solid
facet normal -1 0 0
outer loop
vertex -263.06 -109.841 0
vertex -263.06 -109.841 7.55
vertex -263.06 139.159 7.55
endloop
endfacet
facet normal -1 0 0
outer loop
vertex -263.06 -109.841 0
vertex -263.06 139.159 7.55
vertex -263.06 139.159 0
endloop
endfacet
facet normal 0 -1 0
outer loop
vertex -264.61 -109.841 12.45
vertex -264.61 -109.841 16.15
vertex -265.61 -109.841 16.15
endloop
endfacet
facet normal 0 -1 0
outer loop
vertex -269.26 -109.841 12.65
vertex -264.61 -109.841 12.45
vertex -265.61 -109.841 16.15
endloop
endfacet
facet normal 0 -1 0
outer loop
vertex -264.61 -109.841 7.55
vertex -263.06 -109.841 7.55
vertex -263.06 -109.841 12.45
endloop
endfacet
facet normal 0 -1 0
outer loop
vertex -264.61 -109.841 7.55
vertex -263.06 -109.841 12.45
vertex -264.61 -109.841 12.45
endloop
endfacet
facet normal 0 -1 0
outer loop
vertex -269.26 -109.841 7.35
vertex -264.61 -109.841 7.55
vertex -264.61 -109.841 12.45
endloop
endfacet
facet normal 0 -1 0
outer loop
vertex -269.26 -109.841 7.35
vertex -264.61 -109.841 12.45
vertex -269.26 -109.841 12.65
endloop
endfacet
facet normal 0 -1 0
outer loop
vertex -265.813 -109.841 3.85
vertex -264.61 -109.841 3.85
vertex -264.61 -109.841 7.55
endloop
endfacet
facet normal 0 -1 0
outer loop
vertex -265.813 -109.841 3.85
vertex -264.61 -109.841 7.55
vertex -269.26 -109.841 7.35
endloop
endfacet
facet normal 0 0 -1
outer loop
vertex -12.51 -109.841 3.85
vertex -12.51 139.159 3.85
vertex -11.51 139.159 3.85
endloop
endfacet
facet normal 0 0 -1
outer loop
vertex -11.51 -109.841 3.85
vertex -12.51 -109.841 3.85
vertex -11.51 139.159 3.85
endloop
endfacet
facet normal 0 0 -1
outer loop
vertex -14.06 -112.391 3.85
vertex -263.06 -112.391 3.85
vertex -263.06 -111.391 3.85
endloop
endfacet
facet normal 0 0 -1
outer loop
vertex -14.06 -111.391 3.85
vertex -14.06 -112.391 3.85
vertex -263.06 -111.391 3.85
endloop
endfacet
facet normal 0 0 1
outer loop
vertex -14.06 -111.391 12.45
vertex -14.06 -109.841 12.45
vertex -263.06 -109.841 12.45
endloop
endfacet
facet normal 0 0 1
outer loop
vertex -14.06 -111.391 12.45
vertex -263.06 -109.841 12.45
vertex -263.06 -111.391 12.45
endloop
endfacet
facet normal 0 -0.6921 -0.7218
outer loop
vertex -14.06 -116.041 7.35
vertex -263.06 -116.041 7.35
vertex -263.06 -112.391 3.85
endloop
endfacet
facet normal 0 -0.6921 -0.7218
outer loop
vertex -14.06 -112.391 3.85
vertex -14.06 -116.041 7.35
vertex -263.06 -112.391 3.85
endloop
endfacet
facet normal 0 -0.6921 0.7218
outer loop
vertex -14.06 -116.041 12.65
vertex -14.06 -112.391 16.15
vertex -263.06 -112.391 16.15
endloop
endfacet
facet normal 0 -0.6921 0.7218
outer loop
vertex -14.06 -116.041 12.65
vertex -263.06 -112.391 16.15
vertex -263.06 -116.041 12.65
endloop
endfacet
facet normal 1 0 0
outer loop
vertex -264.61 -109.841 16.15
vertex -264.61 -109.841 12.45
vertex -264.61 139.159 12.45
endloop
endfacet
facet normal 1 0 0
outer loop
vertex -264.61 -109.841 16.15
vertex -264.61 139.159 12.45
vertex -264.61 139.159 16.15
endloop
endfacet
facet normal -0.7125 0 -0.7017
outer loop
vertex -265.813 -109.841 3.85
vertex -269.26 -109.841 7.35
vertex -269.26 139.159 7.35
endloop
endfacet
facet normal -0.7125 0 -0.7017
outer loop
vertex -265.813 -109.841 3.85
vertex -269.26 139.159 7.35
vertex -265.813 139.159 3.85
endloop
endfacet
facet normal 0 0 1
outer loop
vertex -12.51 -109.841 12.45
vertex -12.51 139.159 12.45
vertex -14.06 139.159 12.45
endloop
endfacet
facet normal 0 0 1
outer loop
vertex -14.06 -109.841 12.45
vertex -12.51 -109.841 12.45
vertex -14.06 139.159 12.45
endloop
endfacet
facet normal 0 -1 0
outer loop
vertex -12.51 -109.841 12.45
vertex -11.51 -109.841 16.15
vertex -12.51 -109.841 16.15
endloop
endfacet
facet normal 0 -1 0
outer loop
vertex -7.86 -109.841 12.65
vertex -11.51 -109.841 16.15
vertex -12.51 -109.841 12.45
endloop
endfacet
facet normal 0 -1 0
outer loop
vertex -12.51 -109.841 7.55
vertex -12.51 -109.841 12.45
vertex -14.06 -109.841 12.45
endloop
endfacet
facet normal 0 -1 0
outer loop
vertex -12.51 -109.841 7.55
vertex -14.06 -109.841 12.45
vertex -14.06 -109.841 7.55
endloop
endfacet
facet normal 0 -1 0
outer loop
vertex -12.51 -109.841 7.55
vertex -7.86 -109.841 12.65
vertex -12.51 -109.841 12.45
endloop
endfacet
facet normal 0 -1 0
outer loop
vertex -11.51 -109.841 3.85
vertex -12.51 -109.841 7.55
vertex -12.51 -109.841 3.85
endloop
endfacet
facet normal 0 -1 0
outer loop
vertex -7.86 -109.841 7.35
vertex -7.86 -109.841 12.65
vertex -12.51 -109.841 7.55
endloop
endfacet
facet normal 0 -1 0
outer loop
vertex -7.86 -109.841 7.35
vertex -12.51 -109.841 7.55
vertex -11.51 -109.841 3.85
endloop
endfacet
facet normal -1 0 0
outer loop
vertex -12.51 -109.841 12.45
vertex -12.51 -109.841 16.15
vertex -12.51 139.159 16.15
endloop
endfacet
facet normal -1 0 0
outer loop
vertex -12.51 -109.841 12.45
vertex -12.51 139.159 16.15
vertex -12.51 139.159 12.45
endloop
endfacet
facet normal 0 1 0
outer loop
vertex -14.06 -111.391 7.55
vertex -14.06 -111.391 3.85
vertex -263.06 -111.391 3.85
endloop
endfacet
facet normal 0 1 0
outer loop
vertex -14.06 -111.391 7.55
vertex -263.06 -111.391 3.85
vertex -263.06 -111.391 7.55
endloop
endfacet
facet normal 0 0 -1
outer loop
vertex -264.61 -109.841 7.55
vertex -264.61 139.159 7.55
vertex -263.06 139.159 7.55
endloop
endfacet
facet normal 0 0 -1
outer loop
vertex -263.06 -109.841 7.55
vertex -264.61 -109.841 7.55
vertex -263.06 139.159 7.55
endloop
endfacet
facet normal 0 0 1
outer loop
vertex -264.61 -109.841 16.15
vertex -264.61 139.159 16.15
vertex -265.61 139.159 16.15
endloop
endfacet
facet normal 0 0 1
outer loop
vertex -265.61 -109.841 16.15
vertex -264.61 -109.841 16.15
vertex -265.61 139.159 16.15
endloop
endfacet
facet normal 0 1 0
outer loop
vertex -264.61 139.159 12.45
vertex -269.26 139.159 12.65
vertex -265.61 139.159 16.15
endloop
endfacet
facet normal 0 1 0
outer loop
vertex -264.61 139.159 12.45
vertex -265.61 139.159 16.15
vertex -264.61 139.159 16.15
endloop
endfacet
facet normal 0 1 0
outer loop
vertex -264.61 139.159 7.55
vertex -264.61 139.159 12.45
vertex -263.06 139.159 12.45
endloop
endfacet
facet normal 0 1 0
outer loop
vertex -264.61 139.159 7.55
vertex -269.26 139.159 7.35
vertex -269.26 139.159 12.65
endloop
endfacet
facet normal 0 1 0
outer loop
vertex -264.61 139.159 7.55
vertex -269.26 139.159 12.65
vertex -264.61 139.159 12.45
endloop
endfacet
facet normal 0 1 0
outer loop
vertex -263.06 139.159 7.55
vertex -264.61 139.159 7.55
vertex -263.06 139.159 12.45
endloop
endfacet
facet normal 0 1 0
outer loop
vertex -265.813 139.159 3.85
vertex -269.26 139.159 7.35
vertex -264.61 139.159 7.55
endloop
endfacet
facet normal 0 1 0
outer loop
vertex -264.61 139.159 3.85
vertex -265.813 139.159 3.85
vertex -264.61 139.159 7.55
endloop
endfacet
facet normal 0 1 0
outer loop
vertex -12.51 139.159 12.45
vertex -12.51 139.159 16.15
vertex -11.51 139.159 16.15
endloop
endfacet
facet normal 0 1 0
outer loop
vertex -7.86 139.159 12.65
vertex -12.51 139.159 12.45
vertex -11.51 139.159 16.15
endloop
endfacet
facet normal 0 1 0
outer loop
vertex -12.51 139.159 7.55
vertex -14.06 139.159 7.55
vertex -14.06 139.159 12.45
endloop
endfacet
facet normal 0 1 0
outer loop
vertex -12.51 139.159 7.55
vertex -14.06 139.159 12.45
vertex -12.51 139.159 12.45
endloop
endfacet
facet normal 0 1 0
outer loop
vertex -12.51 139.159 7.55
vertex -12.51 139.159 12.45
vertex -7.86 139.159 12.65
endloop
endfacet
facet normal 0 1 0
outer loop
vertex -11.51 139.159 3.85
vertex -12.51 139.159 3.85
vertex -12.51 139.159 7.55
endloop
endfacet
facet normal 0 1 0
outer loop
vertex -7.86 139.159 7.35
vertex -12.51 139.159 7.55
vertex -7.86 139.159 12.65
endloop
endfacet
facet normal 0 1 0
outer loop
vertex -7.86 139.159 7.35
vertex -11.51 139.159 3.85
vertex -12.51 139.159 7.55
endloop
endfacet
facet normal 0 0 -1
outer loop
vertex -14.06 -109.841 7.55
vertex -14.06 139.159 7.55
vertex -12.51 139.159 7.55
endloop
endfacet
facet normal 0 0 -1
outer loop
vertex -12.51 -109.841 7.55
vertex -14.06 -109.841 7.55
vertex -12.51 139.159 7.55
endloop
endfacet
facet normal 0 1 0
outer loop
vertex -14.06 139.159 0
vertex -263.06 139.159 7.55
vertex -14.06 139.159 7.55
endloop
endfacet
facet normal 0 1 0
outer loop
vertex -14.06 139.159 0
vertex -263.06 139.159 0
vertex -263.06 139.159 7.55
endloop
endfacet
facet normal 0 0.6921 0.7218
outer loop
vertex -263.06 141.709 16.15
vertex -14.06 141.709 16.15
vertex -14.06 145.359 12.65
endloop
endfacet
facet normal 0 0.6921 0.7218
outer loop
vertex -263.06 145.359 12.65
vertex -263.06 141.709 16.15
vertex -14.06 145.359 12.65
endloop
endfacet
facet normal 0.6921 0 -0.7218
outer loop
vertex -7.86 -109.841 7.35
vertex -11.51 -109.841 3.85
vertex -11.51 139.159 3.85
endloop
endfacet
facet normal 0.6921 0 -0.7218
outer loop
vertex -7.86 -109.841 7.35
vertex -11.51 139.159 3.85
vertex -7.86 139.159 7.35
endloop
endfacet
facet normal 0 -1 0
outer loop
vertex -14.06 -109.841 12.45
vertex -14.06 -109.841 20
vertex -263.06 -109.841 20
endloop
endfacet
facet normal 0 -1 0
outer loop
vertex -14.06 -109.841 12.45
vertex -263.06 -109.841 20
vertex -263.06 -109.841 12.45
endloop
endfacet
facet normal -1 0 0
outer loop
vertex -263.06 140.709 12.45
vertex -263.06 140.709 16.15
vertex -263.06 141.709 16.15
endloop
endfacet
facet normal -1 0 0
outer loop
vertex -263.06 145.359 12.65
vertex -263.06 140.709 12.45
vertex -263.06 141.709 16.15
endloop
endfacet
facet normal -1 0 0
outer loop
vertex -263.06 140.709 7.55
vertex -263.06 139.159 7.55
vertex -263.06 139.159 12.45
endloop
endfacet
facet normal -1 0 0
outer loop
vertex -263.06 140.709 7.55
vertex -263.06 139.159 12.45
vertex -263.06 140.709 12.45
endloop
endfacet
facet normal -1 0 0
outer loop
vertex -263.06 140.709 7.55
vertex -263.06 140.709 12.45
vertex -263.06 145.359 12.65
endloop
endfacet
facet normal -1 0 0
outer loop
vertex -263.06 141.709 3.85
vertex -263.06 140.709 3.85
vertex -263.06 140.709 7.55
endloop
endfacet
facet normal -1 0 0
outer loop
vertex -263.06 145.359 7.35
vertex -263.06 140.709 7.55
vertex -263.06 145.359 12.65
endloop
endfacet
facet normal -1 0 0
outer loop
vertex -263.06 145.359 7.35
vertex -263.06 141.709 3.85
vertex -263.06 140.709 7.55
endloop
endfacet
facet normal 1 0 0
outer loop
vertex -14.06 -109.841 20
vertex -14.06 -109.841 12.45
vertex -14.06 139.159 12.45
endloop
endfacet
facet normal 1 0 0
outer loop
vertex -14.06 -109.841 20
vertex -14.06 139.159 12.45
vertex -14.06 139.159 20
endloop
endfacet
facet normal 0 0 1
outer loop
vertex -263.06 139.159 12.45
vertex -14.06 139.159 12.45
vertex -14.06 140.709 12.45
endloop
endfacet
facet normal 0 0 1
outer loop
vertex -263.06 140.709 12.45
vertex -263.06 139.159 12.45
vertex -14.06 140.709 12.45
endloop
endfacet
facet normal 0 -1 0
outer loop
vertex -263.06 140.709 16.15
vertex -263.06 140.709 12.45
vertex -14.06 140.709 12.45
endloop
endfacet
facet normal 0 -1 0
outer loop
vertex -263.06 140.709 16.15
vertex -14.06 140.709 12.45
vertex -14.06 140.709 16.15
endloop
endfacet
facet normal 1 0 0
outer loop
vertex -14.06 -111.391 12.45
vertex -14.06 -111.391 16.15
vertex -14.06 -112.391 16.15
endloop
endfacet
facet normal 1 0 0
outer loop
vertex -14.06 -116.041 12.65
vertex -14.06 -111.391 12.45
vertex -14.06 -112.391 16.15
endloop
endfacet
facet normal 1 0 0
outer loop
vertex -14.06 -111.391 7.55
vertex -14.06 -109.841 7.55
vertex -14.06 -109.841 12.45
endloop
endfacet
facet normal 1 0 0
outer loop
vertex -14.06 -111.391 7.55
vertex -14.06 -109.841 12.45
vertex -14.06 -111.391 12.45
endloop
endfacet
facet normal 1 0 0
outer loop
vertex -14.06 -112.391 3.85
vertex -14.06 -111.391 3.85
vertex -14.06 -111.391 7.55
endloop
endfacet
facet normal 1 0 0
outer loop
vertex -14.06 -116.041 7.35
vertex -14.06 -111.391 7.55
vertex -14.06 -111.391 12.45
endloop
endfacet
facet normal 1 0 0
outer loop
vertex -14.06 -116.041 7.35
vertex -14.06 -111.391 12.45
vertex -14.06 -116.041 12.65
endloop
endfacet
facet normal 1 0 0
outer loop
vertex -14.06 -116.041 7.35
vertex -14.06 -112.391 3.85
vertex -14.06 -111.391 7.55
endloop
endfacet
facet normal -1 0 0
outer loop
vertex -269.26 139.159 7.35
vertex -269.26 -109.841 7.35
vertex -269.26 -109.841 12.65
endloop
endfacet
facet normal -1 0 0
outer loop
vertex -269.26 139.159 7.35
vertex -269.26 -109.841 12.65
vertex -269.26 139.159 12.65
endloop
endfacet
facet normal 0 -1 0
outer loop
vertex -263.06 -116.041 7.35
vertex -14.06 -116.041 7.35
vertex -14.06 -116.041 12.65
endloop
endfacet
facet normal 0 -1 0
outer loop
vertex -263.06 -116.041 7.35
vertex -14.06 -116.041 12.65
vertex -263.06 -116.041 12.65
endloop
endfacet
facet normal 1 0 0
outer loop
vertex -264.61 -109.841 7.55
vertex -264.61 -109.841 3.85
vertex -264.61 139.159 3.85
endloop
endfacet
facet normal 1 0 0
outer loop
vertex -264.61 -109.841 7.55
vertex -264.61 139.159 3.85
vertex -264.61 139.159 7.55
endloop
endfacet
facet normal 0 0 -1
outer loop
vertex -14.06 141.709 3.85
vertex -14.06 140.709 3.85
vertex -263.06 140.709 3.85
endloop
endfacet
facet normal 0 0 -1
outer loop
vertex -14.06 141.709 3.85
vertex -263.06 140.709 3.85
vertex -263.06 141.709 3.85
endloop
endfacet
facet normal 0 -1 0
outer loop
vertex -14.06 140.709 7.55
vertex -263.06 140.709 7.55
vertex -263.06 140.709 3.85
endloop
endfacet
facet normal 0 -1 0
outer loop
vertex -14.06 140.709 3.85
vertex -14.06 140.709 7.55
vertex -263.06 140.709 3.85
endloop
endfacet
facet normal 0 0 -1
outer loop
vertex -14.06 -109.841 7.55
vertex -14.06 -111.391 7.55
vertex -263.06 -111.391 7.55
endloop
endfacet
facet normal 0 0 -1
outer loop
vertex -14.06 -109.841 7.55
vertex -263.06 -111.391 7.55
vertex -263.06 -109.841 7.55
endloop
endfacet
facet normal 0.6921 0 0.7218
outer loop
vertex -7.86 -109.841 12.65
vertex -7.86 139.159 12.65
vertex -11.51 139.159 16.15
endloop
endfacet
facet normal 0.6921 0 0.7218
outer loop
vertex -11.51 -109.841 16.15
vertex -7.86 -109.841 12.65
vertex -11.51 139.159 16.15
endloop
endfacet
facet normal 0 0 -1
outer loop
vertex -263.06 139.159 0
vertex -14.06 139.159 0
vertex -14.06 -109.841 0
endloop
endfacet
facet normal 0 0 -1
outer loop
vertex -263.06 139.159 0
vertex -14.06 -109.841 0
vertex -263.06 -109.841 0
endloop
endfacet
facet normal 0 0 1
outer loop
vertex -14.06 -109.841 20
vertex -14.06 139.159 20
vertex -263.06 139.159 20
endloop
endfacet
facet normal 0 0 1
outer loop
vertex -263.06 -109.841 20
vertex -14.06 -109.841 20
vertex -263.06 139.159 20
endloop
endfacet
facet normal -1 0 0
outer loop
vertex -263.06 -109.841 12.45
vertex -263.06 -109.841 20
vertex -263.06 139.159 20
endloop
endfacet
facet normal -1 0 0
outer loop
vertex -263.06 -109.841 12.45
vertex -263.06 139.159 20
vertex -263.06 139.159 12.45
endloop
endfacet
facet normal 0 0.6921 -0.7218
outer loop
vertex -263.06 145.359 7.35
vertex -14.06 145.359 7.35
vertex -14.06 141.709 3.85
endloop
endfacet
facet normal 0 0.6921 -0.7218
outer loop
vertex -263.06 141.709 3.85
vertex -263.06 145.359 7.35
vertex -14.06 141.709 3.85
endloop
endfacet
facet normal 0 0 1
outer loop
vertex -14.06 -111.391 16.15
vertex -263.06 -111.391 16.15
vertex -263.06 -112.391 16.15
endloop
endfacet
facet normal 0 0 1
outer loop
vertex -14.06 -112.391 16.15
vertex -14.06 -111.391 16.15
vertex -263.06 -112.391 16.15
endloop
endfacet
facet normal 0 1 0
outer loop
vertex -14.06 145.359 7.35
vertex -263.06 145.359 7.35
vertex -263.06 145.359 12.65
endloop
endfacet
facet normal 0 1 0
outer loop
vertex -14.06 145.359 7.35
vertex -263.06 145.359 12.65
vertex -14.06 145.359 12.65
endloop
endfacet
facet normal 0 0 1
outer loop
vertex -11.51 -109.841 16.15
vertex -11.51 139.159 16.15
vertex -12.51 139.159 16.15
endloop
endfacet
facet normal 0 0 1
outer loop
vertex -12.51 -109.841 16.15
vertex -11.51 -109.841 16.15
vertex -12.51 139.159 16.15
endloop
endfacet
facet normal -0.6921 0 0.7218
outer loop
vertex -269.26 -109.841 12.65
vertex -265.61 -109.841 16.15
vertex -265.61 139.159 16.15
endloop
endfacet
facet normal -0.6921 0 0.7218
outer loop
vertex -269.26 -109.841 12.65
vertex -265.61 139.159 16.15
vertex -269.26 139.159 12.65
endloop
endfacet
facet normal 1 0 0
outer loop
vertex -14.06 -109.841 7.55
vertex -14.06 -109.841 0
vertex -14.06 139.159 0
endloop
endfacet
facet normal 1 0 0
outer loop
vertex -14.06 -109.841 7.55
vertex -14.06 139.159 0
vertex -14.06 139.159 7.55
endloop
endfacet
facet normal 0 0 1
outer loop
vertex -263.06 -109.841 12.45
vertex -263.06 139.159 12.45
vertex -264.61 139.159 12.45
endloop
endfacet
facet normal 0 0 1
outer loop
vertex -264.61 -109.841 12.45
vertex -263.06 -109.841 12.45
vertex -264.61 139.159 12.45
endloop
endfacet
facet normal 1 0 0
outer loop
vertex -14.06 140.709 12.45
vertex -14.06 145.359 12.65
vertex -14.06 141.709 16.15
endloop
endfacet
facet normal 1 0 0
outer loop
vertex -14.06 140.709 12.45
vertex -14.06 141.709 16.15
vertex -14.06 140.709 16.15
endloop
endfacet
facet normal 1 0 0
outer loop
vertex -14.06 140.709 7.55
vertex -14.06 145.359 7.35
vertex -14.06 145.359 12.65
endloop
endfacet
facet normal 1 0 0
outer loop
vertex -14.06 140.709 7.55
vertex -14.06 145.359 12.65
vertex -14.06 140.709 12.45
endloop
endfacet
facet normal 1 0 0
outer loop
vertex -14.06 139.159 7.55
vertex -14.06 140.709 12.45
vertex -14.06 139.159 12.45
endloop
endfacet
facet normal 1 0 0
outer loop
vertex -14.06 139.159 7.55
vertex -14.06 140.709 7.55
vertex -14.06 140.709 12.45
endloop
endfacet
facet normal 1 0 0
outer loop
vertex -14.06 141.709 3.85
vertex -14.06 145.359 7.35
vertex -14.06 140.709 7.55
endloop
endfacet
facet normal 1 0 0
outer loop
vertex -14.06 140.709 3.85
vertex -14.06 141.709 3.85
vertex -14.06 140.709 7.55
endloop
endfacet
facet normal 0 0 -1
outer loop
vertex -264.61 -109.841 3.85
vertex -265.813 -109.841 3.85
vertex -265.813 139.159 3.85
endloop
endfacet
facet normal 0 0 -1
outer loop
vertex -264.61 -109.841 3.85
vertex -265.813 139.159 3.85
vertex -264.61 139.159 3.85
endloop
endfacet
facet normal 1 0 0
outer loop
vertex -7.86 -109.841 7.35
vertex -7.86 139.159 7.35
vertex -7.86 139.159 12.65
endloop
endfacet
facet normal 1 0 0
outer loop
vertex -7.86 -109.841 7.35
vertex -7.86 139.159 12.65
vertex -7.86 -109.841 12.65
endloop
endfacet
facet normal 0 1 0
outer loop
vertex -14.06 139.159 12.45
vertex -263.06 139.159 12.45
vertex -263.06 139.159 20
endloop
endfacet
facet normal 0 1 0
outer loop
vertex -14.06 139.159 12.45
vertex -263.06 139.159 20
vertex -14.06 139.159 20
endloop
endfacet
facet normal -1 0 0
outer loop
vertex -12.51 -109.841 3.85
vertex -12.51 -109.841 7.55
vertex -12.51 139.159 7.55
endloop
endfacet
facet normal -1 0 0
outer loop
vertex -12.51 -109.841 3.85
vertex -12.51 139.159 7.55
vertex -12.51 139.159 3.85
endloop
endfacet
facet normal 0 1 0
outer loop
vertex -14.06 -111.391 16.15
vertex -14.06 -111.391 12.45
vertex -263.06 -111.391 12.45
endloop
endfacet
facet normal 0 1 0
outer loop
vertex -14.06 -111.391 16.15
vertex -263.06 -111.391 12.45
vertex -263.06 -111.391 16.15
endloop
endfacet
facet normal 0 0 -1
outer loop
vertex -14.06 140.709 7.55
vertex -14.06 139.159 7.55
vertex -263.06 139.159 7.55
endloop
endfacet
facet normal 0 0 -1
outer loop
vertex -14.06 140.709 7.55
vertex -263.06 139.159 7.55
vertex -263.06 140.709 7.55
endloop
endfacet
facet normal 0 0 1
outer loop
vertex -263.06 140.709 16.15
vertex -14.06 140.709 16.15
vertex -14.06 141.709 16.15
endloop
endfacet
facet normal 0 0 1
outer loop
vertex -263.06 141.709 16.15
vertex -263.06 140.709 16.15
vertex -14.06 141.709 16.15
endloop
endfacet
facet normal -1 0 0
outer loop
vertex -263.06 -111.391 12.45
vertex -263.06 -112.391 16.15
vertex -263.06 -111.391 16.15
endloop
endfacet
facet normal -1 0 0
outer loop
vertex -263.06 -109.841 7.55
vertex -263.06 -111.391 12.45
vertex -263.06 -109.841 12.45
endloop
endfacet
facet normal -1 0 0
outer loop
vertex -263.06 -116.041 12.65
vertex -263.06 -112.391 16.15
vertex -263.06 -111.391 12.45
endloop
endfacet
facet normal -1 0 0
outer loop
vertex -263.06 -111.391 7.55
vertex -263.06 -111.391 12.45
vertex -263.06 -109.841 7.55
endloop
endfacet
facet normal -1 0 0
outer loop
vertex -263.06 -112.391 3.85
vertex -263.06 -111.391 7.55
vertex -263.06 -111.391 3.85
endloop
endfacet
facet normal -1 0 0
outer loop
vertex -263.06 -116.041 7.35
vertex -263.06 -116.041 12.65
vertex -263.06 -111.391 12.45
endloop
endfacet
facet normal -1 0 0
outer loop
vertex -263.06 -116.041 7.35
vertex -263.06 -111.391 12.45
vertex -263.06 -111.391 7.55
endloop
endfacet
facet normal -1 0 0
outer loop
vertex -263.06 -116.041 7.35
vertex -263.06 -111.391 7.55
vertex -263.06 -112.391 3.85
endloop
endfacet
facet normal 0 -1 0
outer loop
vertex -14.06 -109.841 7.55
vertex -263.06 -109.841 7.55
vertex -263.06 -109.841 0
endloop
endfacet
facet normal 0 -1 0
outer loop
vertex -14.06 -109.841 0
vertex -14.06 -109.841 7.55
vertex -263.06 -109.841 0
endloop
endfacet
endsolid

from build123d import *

# Parameters (mm, degrees)
BOSS_EXTRU_3_DEPTH            = 20
ENL_V_MAT_EXTRU_11_DEPTH      = 295.374154069
ENL_V_MAT_EXTRU_11_DEPTH_BACK = 249
ENL_V_MAT_EXTRU_12_DEPTH      = 295.374154069
ENL_V_MAT_EXTRU_12_DEPTH_BACK = 249
ENL_V_MAT_EXTRU_13_DEPTH      = 372.52143865
ENL_V_MAT_EXTRU_13_DEPTH_BACK = 249
ENL_V_MAT_EXTRU_14_DEPTH      = 372.52143865
ENL_V_MAT_EXTRU_14_DEPTH_BACK = 249
ENL_V_MAT_EXTRU_15_DEPTH      = 295.374154069
ENL_V_MAT_EXTRU_15_DEPTH_BACK = 249
ENL_V_MAT_EXTRU_16_DEPTH      = 295.374154069
ENL_V_MAT_EXTRU_16_DEPTH_BACK = 249
ENL_V_MAT_EXTRU_17_DEPTH      = 372.52143865
ENL_V_MAT_EXTRU_17_DEPTH_BACK = 249
ENL_V_MAT_EXTRU_18_DEPTH      = 372.52143865
ENL_V_MAT_EXTRU_18_DEPTH_BACK = 249


with BuildPart() as part:
    # Esquisse1 → Boss.-Extru.3 (new body)
    with BuildSketch(Plane.XY):
        Polygon((-263.060356118, 145.358531169), (-14.060356118, 145.358531169), (-14.060356118, 139.158531169), (-7.860356118, 139.158531169), (-7.860356118, -109.841468831), (-14.060356118, -109.841468831), (-14.060356118, -116.041468831), (-263.060356118, -116.041468831), (-263.060356118, -109.841468831), (-269.260356118, -109.841468831), (-269.260356118, 139.158531169), (-263.060356118, 139.158531169), align=None)
    extrude(amount=BOSS_EXTRU_3_DEPTH)

    # Esquisse4 → Enlèv. mat.-Extru.11 (cut, two sides: drawn at the far end of the back side and taken through both)
    with BuildSketch(Plane(origin=(-14.060356118, 0, 0), x_dir=(0, 0, -1), z_dir=(1, 0, 0)).offset(-ENL_V_MAT_EXTRU_11_DEPTH_BACK)):
        Polygon((-553.411816833, 139.158531169), (-20, 139.158531169), (-12.45, 139.158531169), (-12.45, 140.708531169), (-16.15, 140.708531169), (-16.15, 141.708531169), (-12.65, 145.358531169), (356.535030531, 530.365777294), (-64.826371106, 1510.451097334), (-974.77321847, 1119.243851209), align=None)
    extrude(amount=ENL_V_MAT_EXTRU_11_DEPTH + ENL_V_MAT_EXTRU_11_DEPTH_BACK, mode=Mode.SUBTRACT)

    # Esquisse8 → Enlèv. mat.-Extru.12 (cut, two sides: drawn at the far end of the back side and taken through both)
    with BuildSketch(Plane(origin=(-14.060356118, 0, 0), x_dir=(0, 0, -1), z_dir=(1, 0, 0)).offset(-ENL_V_MAT_EXTRU_12_DEPTH_BACK)):
        Polygon((533.411816833, 139.158531169), (0, 139.158531169), (-7.55, 139.158531169), (-7.55, 140.708531169), (-3.85, 140.708531169), (-3.85, 141.708531169), (-7.35, 145.358531169), (-376.535030531, 530.365777294), (44.826371106, 1510.451097334), (954.77321847, 1119.243851209), align=None)
    extrude(amount=ENL_V_MAT_EXTRU_12_DEPTH + ENL_V_MAT_EXTRU_12_DEPTH_BACK, mode=Mode.SUBTRACT)

    # Esquisse10 → Enlèv. mat.-Extru.13 (cut, two sides: drawn at the far end of the back side and taken through both)
    with BuildSketch(Plane(origin=(0, 139.158531169, 0), x_dir=(1, 0, 0), z_dir=(0, 1, 0)).offset(-ENL_V_MAT_EXTRU_13_DEPTH_BACK)):
        Polygon((-654.267602243, 356.535030531), (-269.260356118, -12.65), (-265.610356118, -16.15), (-264.610356118, -16.15), (-264.610356118, -12.45), (-263.060356118, -12.45), (-263.060356118, -20), (-263.060356118, -553.411816833), (-1243.145676157, -974.77321847), (-1634.352922282, -64.826371106), align=None)
    extrude(amount=ENL_V_MAT_EXTRU_13_DEPTH + ENL_V_MAT_EXTRU_13_DEPTH_BACK, mode=Mode.SUBTRACT)

    # Esquisse11 → Enlèv. mat.-Extru.14 (cut, two sides: drawn at the far end of the back side and taken through both)
    with BuildSketch(Plane(origin=(0, 139.158531169, 0), x_dir=(1, 0, 0), z_dir=(0, 1, 0)).offset(-ENL_V_MAT_EXTRU_14_DEPTH_BACK)):
        Polygon((-643.553156031, -387.393505759), (-269.260356118, -7.35), (-265.813317082, -3.85), (-264.610356118, -3.85), (-264.610356118, -7.55), (-263.060356118, -7.55), (-263.060356118, 0), (-263.060356118, 533.411816833), (-1249.023765439, 940.82907325), (-1629.516565352, 20.023750658), align=None)
    extrude(amount=ENL_V_MAT_EXTRU_14_DEPTH + ENL_V_MAT_EXTRU_14_DEPTH_BACK, mode=Mode.SUBTRACT)

    # Esquisse12 → Enlèv. mat.-Extru.15 (cut, two sides: drawn at the far end of the back side and taken through both)
    with BuildSketch(Plane.ZY.offset(263.060356118).offset(-ENL_V_MAT_EXTRU_15_DEPTH_BACK)):
        Polygon((-356.535030531, -501.048714956), (12.65, -116.041468831), (16.15, -112.391468831), (16.15, -111.391468831), (12.45, -111.391468831), (12.45, -109.841468831), (20, -109.841468831), (553.411816833, -109.841468831), (974.77321847, -1089.92678887), (64.826371106, -1481.134034995), align=None)
    extrude(amount=ENL_V_MAT_EXTRU_15_DEPTH + ENL_V_MAT_EXTRU_15_DEPTH_BACK, mode=Mode.SUBTRACT)

    # Esquisse13 → Enlèv. mat.-Extru.16 (cut, two sides: drawn at the far end of the back side and taken through both)
    with BuildSketch(Plane.ZY.offset(263.060356118).offset(-ENL_V_MAT_EXTRU_16_DEPTH_BACK)):
        Polygon((376.535030531, -501.048714956), (7.35, -116.041468831), (3.85, -112.391468831), (3.85, -111.391468831), (7.55, -111.391468831), (7.55, -109.841468831), (0, -109.841468831), (-533.411816833, -109.841468831), (-954.77321847, -1089.92678887), (-44.826371106, -1481.134034995), align=None)
    extrude(amount=ENL_V_MAT_EXTRU_16_DEPTH + ENL_V_MAT_EXTRU_16_DEPTH_BACK, mode=Mode.SUBTRACT)

    # Esquisse15 → Enlèv. mat.-Extru.17 (cut, two sides: drawn at the far end of the back side and taken through both)
    with BuildSketch(Plane(origin=(0, 139.158531169, 0), x_dir=(1, 0, 0), z_dir=(0, 1, 0)).offset(-ENL_V_MAT_EXTRU_17_DEPTH_BACK)):
        Polygon((377.146890007, -376.535030531), (-7.860356118, -7.35), (-11.510356118, -3.85), (-12.510356118, -3.85), (-12.510356118, -7.55), (-14.060356118, -7.55), (-14.060356118, 0), (-14.060356118, 533.411816833), (966.024963922, 954.77321847), (1357.232210047, 44.826371106), align=None)
    extrude(amount=ENL_V_MAT_EXTRU_17_DEPTH + ENL_V_MAT_EXTRU_17_DEPTH_BACK, mode=Mode.SUBTRACT)

    # Esquisse16 → Enlèv. mat.-Extru.18 (cut, two sides: drawn at the far end of the back side and taken through both)
    with BuildSketch(Plane(origin=(0, 139.158531169, 0), x_dir=(1, 0, 0), z_dir=(0, 1, 0)).offset(-ENL_V_MAT_EXTRU_18_DEPTH_BACK)):
        Polygon((377.146890007, 356.535030531), (-7.860356118, -12.65), (-11.510356118, -16.15), (-12.510356118, -16.15), (-12.510356118, -12.45), (-14.060356118, -12.45), (-14.060356118, -20), (-14.060356118, -553.411816833), (966.024963922, -974.77321847), (1357.232210047, -64.826371106), align=None)
    extrude(amount=ENL_V_MAT_EXTRU_18_DEPTH + ENL_V_MAT_EXTRU_18_DEPTH_BACK, mode=Mode.SUBTRACT)


solid = part.part
